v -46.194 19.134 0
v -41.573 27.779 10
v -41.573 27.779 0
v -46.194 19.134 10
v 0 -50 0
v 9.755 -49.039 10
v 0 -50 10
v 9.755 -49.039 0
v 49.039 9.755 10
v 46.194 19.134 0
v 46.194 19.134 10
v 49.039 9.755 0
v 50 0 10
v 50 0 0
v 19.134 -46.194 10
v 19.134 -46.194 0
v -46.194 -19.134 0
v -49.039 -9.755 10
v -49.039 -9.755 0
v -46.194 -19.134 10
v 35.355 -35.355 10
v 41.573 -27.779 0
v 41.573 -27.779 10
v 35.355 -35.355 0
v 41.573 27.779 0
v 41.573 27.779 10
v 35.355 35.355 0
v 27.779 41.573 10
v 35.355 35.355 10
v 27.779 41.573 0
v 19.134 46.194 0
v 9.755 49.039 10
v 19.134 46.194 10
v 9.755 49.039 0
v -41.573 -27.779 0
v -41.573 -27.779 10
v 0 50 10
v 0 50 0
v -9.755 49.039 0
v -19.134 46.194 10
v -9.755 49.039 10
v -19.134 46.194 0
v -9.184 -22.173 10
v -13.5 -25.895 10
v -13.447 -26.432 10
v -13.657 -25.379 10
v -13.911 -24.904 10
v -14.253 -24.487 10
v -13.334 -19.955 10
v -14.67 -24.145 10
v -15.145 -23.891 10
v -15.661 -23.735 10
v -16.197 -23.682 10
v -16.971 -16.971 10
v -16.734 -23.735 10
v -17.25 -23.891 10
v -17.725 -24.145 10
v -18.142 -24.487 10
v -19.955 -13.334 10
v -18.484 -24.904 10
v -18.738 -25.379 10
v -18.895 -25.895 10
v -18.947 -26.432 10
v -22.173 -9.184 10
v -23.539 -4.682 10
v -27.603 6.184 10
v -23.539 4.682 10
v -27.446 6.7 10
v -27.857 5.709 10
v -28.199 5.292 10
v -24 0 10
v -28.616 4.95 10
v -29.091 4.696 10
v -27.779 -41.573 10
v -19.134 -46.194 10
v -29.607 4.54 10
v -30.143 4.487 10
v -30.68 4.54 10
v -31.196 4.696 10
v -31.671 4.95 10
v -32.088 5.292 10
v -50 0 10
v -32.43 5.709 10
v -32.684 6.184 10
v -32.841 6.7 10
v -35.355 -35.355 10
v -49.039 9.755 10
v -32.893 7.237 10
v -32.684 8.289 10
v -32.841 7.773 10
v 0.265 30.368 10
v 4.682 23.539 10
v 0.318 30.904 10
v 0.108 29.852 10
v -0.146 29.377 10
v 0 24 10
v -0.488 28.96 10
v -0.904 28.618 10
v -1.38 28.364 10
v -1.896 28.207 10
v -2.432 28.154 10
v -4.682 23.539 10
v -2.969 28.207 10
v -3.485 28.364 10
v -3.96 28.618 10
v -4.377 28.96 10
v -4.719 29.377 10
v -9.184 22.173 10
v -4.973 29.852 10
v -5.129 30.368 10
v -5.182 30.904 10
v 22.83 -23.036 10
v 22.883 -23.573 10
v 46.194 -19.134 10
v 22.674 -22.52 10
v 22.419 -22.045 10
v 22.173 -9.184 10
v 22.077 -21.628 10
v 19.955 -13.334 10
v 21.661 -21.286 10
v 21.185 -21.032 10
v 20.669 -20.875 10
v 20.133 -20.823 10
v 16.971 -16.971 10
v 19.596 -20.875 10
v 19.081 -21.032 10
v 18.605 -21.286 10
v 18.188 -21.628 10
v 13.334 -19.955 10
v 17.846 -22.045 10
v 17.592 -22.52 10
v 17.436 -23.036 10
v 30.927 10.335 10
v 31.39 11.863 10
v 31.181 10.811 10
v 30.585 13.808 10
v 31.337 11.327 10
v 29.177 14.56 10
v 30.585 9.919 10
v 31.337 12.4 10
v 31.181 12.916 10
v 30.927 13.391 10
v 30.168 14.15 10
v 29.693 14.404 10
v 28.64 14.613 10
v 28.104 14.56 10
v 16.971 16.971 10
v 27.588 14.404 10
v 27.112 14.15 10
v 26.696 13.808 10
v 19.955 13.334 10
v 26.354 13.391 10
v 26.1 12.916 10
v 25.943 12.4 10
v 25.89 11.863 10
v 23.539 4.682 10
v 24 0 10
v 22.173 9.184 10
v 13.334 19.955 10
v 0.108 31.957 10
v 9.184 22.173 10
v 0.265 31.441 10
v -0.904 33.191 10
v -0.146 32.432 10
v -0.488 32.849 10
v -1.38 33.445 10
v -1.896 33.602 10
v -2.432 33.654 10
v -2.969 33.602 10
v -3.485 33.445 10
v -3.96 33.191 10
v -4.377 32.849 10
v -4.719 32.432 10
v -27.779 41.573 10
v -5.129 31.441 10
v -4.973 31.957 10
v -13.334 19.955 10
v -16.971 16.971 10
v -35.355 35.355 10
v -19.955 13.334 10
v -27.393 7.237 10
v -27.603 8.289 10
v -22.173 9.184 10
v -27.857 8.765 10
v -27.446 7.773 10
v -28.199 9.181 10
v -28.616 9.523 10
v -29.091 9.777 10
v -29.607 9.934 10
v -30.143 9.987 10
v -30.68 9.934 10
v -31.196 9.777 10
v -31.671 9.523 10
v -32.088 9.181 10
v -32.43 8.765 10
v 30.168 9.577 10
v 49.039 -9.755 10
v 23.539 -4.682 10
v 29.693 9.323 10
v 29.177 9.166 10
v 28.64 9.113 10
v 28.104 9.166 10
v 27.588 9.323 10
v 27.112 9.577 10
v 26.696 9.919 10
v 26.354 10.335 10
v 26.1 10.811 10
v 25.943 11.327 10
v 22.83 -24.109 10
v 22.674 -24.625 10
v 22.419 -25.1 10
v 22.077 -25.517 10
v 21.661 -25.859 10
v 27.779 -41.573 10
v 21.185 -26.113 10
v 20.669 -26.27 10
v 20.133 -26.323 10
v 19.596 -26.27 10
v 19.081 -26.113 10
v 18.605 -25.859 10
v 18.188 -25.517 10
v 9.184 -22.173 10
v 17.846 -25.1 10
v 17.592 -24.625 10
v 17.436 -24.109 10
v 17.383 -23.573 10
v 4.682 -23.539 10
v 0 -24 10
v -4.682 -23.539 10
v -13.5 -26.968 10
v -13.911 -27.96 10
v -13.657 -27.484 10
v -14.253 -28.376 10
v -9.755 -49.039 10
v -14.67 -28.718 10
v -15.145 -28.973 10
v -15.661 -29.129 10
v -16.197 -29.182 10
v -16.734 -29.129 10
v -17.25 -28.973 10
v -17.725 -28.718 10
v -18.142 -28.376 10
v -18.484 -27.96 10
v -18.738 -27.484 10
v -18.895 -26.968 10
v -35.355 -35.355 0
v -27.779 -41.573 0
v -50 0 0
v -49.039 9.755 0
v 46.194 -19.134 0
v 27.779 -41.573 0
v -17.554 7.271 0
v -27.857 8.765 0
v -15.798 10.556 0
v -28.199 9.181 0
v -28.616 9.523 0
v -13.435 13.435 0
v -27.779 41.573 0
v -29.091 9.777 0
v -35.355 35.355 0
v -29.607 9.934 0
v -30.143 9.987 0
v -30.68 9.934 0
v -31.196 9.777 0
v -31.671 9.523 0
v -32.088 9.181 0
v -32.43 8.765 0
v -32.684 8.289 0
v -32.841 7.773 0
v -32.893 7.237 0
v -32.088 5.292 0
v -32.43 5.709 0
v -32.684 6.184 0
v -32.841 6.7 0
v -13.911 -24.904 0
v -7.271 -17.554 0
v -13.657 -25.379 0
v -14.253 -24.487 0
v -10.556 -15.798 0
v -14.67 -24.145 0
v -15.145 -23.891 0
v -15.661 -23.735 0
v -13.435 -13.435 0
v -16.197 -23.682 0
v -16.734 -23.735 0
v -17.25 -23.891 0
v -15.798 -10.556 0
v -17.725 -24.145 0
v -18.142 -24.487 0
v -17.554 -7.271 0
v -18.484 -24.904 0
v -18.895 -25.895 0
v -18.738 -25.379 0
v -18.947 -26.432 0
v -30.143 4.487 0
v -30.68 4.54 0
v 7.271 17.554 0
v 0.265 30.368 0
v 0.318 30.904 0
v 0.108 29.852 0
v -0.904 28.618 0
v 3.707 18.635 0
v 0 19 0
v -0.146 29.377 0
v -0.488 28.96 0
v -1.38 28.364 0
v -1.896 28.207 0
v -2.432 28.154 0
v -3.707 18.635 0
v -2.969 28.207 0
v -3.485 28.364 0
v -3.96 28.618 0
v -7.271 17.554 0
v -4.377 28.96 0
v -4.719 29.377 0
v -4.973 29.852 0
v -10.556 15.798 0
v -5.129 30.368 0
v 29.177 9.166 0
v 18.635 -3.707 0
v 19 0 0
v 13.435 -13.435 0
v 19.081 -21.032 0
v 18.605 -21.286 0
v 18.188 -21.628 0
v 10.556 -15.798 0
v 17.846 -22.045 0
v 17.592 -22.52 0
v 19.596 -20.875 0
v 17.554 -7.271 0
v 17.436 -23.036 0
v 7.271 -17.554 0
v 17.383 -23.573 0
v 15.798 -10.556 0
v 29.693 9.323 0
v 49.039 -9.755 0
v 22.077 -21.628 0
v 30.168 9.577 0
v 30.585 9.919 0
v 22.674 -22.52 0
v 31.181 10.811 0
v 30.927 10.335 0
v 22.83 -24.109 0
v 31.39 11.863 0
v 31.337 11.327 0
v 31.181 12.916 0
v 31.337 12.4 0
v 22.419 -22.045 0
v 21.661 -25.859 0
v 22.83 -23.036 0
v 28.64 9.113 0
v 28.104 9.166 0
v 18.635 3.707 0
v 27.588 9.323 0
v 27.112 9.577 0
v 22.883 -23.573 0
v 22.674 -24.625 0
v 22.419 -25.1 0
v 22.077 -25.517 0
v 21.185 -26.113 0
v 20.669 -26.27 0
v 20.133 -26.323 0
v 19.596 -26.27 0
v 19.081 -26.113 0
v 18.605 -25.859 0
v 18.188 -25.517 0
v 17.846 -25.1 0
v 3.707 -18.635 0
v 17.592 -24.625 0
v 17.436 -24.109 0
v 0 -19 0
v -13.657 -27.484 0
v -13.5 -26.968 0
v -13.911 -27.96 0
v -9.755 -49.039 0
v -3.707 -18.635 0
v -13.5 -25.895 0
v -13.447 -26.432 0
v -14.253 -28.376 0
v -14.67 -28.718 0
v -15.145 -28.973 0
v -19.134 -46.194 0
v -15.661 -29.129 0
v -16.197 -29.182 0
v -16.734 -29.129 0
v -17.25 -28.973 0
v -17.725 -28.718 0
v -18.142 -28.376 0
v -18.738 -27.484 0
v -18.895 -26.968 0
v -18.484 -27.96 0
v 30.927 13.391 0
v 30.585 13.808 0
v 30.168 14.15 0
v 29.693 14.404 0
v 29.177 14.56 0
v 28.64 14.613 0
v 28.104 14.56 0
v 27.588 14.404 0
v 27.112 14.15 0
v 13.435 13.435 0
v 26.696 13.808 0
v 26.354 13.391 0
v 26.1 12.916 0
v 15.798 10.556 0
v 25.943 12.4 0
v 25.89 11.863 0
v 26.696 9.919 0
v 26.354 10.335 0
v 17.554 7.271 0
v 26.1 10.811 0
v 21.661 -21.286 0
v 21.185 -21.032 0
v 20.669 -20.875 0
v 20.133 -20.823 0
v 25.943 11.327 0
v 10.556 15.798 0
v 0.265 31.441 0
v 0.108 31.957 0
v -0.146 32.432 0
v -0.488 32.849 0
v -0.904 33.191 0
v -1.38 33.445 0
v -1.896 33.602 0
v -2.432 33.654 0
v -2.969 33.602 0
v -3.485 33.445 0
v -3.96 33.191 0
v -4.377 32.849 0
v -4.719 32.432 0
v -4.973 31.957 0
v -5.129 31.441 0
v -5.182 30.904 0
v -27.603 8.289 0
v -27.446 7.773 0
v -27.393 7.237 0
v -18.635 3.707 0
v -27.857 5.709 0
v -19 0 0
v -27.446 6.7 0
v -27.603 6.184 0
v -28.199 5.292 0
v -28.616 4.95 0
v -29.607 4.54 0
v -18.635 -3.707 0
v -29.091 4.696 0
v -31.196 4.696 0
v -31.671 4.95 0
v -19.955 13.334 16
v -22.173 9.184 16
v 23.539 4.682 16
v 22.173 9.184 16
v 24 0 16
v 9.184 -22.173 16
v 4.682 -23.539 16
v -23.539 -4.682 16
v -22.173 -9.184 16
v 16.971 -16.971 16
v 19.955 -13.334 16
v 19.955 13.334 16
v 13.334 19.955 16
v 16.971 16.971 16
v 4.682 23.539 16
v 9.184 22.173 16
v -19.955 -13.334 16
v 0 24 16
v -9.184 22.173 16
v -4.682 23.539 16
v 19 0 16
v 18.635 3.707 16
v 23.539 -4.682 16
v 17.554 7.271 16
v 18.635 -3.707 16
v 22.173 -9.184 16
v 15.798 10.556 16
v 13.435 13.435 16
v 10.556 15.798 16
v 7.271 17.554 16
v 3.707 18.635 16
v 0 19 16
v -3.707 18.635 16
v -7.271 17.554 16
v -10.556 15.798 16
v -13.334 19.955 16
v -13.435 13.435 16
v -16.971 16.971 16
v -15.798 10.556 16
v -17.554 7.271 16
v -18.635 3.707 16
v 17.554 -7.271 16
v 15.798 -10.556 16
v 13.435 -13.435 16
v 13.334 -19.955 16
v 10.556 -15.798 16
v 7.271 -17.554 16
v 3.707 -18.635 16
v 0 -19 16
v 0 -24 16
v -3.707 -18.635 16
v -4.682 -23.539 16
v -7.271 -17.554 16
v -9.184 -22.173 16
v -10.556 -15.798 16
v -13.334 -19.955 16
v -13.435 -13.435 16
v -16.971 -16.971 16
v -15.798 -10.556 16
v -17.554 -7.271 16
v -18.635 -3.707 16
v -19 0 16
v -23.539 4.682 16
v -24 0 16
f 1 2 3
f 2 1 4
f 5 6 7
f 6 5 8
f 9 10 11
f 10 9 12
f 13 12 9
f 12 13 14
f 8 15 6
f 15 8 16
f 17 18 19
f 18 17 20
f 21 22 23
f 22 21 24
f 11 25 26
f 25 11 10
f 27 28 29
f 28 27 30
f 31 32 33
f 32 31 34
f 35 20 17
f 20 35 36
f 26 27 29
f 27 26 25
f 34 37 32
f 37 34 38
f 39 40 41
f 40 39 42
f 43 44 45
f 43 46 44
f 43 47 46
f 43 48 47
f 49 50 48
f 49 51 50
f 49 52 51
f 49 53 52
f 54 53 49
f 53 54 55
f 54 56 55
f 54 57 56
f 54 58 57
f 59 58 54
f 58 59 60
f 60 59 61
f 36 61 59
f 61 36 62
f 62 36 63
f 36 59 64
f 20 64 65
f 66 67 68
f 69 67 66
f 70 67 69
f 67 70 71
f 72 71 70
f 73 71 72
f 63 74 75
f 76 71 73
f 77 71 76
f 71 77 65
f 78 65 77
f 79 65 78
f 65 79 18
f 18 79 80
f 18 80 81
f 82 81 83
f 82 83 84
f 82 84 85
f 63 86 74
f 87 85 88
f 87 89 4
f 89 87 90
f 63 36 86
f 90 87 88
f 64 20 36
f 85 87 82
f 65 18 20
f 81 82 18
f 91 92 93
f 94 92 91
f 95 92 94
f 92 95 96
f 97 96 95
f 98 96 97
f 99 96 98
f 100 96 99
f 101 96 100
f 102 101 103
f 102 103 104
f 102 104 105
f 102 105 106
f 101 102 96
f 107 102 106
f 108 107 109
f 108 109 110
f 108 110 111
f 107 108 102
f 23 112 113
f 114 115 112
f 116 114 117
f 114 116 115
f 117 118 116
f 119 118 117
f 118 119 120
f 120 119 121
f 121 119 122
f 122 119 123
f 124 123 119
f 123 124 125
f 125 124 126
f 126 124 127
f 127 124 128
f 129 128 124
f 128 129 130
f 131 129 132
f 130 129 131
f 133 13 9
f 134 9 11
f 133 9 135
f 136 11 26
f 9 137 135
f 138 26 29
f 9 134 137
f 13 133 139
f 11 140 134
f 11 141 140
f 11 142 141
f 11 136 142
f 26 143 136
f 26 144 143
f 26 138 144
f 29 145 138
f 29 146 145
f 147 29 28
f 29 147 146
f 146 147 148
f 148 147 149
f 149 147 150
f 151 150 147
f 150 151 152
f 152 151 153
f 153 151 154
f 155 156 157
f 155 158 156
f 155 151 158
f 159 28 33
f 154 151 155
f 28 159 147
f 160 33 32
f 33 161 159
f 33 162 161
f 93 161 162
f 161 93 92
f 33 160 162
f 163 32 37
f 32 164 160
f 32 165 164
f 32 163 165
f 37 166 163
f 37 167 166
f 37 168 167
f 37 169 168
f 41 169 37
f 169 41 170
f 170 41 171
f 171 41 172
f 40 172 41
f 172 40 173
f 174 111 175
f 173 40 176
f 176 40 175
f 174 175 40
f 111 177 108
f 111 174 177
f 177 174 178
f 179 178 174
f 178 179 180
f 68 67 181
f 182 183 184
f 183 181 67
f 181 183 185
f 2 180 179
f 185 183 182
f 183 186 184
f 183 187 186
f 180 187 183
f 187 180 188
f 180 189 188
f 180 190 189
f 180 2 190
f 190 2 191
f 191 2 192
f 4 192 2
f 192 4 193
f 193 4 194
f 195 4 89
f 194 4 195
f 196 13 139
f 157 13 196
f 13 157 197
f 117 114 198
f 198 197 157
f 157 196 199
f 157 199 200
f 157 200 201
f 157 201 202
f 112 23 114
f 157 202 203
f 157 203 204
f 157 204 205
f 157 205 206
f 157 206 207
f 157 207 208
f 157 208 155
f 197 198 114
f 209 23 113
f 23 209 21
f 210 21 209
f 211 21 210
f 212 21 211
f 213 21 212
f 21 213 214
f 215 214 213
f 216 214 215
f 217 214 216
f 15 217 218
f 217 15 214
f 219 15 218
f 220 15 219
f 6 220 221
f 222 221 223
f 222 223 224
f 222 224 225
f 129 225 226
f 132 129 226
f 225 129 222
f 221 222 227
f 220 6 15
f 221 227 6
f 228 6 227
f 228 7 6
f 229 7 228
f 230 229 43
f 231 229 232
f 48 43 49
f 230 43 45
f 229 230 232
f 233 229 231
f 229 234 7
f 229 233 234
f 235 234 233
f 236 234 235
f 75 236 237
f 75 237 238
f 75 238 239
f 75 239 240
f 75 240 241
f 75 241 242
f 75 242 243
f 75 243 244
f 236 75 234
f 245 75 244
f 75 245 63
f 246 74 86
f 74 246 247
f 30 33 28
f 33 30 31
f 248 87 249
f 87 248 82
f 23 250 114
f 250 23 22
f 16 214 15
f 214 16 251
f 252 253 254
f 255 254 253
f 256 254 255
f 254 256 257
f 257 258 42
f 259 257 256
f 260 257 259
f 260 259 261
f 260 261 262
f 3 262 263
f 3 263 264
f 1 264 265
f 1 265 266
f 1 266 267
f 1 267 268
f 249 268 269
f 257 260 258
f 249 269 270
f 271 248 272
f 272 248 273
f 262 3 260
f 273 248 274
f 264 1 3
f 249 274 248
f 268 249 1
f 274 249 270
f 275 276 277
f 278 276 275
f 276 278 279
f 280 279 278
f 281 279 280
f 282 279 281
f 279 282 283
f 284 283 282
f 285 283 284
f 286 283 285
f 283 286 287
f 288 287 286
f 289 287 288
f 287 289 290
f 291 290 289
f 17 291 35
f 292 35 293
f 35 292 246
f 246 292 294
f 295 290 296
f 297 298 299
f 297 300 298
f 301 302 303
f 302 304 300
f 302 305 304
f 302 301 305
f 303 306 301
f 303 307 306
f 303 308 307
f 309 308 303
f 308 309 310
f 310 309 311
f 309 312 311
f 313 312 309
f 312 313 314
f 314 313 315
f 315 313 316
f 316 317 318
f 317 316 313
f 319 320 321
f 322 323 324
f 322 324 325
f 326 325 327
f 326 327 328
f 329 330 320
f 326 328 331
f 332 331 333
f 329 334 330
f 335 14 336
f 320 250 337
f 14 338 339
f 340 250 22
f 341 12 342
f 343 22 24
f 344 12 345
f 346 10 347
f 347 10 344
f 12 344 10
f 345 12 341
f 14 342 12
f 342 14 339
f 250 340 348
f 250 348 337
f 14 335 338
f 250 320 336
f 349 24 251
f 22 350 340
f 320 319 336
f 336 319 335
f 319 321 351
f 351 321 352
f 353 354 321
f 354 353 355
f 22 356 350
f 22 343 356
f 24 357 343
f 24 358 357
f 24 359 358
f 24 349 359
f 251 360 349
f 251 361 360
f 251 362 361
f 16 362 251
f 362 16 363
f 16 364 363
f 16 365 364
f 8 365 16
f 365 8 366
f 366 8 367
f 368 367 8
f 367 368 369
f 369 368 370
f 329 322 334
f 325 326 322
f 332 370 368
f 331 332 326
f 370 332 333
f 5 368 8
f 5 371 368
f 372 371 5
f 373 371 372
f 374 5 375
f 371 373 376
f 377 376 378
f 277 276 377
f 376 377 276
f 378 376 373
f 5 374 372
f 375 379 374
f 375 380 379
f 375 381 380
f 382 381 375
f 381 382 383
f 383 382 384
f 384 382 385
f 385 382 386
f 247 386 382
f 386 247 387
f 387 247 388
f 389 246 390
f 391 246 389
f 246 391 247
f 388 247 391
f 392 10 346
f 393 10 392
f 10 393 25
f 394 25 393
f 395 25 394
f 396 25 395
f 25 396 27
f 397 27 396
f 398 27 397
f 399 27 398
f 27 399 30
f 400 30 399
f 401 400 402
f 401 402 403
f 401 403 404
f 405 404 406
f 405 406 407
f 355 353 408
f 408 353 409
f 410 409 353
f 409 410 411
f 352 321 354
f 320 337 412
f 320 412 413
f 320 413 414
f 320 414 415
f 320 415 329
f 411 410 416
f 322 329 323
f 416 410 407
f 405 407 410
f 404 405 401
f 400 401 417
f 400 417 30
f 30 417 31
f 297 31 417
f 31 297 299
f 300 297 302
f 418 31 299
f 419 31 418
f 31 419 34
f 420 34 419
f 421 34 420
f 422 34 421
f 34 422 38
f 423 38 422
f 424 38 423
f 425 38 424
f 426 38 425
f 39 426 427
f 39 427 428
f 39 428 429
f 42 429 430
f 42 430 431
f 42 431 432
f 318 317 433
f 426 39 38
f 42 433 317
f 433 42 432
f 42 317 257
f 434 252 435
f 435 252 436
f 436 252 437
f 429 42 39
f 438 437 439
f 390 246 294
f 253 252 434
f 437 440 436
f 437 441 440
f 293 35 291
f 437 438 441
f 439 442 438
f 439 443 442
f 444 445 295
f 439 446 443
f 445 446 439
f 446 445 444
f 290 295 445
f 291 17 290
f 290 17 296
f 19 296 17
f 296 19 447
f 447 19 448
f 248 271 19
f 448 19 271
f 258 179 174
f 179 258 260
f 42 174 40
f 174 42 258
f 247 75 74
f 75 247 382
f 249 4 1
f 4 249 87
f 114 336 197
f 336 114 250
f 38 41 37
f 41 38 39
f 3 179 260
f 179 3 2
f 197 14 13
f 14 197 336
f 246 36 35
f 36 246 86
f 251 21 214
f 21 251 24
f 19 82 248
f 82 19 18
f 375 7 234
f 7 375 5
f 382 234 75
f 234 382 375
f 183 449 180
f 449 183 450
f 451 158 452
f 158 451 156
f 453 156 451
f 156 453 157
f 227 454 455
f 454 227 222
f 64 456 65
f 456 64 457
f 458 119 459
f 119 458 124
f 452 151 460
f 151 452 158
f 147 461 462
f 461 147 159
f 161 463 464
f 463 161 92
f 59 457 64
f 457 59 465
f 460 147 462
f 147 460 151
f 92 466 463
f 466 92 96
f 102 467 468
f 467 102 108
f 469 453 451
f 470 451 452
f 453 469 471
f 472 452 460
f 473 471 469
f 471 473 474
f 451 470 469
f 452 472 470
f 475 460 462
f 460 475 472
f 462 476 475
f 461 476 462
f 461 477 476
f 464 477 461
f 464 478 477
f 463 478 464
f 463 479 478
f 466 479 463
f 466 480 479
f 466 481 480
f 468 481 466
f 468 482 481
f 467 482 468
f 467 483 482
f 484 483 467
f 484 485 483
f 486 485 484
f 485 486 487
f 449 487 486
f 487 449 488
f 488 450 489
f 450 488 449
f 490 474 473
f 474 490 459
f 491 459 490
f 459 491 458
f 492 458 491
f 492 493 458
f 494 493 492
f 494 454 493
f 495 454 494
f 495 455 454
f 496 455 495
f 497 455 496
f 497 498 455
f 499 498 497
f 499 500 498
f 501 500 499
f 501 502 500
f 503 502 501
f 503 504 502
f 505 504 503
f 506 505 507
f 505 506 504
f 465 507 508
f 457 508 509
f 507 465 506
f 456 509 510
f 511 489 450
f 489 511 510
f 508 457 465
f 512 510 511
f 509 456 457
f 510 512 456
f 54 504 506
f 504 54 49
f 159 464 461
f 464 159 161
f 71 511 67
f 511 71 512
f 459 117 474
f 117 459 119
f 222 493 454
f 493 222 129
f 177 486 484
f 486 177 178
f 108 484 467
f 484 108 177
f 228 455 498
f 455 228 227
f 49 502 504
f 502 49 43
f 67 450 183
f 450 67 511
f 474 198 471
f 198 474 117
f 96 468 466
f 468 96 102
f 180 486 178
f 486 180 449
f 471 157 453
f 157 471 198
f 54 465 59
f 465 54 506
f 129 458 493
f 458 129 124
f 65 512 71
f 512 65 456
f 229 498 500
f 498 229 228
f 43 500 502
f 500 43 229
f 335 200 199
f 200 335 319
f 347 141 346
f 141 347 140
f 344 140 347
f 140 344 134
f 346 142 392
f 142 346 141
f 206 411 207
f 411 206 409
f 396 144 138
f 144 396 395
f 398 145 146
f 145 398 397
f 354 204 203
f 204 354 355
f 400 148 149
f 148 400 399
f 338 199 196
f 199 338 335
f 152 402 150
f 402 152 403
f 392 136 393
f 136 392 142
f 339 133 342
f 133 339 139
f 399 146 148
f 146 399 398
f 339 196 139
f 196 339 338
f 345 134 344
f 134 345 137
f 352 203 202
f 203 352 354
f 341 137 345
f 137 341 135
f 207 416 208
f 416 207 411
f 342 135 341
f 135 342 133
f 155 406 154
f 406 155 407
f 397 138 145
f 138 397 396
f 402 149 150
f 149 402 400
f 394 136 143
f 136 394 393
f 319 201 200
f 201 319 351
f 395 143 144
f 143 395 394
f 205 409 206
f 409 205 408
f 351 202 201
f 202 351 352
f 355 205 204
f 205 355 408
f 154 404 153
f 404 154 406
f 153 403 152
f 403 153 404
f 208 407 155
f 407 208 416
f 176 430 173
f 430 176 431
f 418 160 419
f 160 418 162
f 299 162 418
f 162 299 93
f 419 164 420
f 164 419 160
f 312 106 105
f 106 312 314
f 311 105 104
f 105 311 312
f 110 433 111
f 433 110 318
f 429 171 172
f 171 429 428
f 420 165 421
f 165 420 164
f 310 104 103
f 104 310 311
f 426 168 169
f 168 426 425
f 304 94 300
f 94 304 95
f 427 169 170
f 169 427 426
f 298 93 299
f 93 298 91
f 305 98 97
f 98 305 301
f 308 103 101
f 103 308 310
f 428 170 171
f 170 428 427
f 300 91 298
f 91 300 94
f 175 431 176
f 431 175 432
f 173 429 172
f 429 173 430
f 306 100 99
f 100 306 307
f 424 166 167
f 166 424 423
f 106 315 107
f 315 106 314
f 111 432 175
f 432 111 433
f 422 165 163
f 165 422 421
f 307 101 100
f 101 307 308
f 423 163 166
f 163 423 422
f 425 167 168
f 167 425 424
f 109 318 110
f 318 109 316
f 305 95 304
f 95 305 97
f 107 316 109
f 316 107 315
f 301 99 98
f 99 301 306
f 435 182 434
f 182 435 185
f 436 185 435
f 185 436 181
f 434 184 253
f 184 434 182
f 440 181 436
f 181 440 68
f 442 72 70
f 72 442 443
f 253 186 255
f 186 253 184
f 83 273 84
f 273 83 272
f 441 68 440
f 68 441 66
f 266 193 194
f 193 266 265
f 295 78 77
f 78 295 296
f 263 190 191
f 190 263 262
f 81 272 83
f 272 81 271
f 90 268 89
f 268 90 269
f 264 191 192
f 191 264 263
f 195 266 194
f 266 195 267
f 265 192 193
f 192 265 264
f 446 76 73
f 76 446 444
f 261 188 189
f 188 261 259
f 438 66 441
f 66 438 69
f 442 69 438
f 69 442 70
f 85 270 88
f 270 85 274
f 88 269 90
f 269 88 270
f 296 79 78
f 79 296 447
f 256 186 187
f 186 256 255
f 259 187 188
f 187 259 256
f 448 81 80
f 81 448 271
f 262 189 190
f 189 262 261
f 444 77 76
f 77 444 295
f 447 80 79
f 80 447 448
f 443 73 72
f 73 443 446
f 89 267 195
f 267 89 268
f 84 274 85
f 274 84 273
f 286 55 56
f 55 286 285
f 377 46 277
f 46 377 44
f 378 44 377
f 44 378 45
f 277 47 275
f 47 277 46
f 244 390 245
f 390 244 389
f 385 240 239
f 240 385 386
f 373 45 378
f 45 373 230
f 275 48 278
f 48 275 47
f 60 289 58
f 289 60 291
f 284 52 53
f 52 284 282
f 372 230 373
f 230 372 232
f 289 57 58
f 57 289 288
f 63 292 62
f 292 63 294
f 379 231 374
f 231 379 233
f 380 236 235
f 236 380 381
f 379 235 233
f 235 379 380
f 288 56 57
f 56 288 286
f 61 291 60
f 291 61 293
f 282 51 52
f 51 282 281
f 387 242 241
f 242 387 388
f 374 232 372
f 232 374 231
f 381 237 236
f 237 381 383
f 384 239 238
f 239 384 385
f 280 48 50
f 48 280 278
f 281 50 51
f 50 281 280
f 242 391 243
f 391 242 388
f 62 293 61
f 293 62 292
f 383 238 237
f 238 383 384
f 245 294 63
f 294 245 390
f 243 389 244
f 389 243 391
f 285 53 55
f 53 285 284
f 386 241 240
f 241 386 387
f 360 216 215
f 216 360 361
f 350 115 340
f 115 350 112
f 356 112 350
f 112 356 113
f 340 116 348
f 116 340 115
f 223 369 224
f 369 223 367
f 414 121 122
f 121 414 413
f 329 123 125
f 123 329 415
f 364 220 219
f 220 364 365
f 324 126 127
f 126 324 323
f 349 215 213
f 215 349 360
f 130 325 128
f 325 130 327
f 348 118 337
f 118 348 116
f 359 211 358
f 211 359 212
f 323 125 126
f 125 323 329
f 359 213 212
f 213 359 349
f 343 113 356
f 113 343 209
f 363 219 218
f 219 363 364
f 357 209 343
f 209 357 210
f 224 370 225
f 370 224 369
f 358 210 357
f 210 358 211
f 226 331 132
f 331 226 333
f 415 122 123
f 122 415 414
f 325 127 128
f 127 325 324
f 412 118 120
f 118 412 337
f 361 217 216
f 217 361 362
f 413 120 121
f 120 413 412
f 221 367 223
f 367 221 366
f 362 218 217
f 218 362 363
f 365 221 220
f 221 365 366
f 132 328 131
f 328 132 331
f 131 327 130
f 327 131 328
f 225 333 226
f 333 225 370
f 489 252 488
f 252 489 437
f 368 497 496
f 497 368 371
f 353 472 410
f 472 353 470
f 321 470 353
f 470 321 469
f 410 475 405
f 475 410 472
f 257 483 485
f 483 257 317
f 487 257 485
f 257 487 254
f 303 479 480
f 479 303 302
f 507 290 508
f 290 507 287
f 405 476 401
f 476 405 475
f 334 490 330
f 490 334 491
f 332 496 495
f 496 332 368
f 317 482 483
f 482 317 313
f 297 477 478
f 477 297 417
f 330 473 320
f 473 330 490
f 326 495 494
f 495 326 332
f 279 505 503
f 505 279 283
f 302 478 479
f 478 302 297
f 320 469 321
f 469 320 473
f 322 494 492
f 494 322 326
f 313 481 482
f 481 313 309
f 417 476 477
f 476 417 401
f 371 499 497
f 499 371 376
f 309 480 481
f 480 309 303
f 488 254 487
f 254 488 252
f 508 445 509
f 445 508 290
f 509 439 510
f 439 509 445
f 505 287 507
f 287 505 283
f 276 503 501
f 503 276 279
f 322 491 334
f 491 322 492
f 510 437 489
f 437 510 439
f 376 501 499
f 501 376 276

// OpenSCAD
$fn = 32;

// ----------------------------------------------------------------------
// Flange Ø100 x 10
// 5 holes on a Ø62 bolt circle, bolted joints
// ----------------------------------------------------------------------

// --- parameters (mm) ---
flange_d = 100;    // outside diameter of the flange
thickness = 10;    // flange thickness
holes = 5;         // number of bolt holes
pcd = 62;          // bolt circle diameter
start_deg = 22.5;  // angle of the first hole, from +X
hole_d = 5.5;      // bolt hole diameter
bore_d = 38;       // central through bore
hub_d = 48;        // hub outside diameter
hub_h = 6;         // hub height above the flange face (0 = no hub)

// --- derived feature positions (mm) ---
height = thickness + hub_h;  // = 16   overall height of the part
pcd_r = pcd / 2;             // = 31   bolt circle radius
hole_step = 360 / holes;     // = 72   angular pitch
feature_centers = [
  [pcd_r * cos(start_deg + 0 * hole_step), pcd_r * sin(start_deg + 0 * hole_step)],
  [pcd_r * cos(start_deg + 1 * hole_step), pcd_r * sin(start_deg + 1 * hole_step)],
  [pcd_r * cos(start_deg + 2 * hole_step), pcd_r * sin(start_deg + 2 * hole_step)],
  [pcd_r * cos(start_deg + 3 * hole_step), pcd_r * sin(start_deg + 3 * hole_step)],
  [pcd_r * cos(start_deg + 4 * hole_step), pcd_r * sin(start_deg + 4 * hole_step)]
];   // bolt hole centres on the pitch circle

// flange disc, every hole and the bore cut straight through
difference() {
  union() {
    cylinder(d = flange_d, h = thickness);
    cylinder(d = hub_d, h = height);  // hub, overlapped into the flange
  }
  translate([0, 0, -1]) cylinder(d = bore_d, h = height + 2);  // bore, through
  for (centre = feature_centers)
    translate([centre[0], centre[1], -1]) cylinder(d = hole_d, h = thickness + 2);
}
